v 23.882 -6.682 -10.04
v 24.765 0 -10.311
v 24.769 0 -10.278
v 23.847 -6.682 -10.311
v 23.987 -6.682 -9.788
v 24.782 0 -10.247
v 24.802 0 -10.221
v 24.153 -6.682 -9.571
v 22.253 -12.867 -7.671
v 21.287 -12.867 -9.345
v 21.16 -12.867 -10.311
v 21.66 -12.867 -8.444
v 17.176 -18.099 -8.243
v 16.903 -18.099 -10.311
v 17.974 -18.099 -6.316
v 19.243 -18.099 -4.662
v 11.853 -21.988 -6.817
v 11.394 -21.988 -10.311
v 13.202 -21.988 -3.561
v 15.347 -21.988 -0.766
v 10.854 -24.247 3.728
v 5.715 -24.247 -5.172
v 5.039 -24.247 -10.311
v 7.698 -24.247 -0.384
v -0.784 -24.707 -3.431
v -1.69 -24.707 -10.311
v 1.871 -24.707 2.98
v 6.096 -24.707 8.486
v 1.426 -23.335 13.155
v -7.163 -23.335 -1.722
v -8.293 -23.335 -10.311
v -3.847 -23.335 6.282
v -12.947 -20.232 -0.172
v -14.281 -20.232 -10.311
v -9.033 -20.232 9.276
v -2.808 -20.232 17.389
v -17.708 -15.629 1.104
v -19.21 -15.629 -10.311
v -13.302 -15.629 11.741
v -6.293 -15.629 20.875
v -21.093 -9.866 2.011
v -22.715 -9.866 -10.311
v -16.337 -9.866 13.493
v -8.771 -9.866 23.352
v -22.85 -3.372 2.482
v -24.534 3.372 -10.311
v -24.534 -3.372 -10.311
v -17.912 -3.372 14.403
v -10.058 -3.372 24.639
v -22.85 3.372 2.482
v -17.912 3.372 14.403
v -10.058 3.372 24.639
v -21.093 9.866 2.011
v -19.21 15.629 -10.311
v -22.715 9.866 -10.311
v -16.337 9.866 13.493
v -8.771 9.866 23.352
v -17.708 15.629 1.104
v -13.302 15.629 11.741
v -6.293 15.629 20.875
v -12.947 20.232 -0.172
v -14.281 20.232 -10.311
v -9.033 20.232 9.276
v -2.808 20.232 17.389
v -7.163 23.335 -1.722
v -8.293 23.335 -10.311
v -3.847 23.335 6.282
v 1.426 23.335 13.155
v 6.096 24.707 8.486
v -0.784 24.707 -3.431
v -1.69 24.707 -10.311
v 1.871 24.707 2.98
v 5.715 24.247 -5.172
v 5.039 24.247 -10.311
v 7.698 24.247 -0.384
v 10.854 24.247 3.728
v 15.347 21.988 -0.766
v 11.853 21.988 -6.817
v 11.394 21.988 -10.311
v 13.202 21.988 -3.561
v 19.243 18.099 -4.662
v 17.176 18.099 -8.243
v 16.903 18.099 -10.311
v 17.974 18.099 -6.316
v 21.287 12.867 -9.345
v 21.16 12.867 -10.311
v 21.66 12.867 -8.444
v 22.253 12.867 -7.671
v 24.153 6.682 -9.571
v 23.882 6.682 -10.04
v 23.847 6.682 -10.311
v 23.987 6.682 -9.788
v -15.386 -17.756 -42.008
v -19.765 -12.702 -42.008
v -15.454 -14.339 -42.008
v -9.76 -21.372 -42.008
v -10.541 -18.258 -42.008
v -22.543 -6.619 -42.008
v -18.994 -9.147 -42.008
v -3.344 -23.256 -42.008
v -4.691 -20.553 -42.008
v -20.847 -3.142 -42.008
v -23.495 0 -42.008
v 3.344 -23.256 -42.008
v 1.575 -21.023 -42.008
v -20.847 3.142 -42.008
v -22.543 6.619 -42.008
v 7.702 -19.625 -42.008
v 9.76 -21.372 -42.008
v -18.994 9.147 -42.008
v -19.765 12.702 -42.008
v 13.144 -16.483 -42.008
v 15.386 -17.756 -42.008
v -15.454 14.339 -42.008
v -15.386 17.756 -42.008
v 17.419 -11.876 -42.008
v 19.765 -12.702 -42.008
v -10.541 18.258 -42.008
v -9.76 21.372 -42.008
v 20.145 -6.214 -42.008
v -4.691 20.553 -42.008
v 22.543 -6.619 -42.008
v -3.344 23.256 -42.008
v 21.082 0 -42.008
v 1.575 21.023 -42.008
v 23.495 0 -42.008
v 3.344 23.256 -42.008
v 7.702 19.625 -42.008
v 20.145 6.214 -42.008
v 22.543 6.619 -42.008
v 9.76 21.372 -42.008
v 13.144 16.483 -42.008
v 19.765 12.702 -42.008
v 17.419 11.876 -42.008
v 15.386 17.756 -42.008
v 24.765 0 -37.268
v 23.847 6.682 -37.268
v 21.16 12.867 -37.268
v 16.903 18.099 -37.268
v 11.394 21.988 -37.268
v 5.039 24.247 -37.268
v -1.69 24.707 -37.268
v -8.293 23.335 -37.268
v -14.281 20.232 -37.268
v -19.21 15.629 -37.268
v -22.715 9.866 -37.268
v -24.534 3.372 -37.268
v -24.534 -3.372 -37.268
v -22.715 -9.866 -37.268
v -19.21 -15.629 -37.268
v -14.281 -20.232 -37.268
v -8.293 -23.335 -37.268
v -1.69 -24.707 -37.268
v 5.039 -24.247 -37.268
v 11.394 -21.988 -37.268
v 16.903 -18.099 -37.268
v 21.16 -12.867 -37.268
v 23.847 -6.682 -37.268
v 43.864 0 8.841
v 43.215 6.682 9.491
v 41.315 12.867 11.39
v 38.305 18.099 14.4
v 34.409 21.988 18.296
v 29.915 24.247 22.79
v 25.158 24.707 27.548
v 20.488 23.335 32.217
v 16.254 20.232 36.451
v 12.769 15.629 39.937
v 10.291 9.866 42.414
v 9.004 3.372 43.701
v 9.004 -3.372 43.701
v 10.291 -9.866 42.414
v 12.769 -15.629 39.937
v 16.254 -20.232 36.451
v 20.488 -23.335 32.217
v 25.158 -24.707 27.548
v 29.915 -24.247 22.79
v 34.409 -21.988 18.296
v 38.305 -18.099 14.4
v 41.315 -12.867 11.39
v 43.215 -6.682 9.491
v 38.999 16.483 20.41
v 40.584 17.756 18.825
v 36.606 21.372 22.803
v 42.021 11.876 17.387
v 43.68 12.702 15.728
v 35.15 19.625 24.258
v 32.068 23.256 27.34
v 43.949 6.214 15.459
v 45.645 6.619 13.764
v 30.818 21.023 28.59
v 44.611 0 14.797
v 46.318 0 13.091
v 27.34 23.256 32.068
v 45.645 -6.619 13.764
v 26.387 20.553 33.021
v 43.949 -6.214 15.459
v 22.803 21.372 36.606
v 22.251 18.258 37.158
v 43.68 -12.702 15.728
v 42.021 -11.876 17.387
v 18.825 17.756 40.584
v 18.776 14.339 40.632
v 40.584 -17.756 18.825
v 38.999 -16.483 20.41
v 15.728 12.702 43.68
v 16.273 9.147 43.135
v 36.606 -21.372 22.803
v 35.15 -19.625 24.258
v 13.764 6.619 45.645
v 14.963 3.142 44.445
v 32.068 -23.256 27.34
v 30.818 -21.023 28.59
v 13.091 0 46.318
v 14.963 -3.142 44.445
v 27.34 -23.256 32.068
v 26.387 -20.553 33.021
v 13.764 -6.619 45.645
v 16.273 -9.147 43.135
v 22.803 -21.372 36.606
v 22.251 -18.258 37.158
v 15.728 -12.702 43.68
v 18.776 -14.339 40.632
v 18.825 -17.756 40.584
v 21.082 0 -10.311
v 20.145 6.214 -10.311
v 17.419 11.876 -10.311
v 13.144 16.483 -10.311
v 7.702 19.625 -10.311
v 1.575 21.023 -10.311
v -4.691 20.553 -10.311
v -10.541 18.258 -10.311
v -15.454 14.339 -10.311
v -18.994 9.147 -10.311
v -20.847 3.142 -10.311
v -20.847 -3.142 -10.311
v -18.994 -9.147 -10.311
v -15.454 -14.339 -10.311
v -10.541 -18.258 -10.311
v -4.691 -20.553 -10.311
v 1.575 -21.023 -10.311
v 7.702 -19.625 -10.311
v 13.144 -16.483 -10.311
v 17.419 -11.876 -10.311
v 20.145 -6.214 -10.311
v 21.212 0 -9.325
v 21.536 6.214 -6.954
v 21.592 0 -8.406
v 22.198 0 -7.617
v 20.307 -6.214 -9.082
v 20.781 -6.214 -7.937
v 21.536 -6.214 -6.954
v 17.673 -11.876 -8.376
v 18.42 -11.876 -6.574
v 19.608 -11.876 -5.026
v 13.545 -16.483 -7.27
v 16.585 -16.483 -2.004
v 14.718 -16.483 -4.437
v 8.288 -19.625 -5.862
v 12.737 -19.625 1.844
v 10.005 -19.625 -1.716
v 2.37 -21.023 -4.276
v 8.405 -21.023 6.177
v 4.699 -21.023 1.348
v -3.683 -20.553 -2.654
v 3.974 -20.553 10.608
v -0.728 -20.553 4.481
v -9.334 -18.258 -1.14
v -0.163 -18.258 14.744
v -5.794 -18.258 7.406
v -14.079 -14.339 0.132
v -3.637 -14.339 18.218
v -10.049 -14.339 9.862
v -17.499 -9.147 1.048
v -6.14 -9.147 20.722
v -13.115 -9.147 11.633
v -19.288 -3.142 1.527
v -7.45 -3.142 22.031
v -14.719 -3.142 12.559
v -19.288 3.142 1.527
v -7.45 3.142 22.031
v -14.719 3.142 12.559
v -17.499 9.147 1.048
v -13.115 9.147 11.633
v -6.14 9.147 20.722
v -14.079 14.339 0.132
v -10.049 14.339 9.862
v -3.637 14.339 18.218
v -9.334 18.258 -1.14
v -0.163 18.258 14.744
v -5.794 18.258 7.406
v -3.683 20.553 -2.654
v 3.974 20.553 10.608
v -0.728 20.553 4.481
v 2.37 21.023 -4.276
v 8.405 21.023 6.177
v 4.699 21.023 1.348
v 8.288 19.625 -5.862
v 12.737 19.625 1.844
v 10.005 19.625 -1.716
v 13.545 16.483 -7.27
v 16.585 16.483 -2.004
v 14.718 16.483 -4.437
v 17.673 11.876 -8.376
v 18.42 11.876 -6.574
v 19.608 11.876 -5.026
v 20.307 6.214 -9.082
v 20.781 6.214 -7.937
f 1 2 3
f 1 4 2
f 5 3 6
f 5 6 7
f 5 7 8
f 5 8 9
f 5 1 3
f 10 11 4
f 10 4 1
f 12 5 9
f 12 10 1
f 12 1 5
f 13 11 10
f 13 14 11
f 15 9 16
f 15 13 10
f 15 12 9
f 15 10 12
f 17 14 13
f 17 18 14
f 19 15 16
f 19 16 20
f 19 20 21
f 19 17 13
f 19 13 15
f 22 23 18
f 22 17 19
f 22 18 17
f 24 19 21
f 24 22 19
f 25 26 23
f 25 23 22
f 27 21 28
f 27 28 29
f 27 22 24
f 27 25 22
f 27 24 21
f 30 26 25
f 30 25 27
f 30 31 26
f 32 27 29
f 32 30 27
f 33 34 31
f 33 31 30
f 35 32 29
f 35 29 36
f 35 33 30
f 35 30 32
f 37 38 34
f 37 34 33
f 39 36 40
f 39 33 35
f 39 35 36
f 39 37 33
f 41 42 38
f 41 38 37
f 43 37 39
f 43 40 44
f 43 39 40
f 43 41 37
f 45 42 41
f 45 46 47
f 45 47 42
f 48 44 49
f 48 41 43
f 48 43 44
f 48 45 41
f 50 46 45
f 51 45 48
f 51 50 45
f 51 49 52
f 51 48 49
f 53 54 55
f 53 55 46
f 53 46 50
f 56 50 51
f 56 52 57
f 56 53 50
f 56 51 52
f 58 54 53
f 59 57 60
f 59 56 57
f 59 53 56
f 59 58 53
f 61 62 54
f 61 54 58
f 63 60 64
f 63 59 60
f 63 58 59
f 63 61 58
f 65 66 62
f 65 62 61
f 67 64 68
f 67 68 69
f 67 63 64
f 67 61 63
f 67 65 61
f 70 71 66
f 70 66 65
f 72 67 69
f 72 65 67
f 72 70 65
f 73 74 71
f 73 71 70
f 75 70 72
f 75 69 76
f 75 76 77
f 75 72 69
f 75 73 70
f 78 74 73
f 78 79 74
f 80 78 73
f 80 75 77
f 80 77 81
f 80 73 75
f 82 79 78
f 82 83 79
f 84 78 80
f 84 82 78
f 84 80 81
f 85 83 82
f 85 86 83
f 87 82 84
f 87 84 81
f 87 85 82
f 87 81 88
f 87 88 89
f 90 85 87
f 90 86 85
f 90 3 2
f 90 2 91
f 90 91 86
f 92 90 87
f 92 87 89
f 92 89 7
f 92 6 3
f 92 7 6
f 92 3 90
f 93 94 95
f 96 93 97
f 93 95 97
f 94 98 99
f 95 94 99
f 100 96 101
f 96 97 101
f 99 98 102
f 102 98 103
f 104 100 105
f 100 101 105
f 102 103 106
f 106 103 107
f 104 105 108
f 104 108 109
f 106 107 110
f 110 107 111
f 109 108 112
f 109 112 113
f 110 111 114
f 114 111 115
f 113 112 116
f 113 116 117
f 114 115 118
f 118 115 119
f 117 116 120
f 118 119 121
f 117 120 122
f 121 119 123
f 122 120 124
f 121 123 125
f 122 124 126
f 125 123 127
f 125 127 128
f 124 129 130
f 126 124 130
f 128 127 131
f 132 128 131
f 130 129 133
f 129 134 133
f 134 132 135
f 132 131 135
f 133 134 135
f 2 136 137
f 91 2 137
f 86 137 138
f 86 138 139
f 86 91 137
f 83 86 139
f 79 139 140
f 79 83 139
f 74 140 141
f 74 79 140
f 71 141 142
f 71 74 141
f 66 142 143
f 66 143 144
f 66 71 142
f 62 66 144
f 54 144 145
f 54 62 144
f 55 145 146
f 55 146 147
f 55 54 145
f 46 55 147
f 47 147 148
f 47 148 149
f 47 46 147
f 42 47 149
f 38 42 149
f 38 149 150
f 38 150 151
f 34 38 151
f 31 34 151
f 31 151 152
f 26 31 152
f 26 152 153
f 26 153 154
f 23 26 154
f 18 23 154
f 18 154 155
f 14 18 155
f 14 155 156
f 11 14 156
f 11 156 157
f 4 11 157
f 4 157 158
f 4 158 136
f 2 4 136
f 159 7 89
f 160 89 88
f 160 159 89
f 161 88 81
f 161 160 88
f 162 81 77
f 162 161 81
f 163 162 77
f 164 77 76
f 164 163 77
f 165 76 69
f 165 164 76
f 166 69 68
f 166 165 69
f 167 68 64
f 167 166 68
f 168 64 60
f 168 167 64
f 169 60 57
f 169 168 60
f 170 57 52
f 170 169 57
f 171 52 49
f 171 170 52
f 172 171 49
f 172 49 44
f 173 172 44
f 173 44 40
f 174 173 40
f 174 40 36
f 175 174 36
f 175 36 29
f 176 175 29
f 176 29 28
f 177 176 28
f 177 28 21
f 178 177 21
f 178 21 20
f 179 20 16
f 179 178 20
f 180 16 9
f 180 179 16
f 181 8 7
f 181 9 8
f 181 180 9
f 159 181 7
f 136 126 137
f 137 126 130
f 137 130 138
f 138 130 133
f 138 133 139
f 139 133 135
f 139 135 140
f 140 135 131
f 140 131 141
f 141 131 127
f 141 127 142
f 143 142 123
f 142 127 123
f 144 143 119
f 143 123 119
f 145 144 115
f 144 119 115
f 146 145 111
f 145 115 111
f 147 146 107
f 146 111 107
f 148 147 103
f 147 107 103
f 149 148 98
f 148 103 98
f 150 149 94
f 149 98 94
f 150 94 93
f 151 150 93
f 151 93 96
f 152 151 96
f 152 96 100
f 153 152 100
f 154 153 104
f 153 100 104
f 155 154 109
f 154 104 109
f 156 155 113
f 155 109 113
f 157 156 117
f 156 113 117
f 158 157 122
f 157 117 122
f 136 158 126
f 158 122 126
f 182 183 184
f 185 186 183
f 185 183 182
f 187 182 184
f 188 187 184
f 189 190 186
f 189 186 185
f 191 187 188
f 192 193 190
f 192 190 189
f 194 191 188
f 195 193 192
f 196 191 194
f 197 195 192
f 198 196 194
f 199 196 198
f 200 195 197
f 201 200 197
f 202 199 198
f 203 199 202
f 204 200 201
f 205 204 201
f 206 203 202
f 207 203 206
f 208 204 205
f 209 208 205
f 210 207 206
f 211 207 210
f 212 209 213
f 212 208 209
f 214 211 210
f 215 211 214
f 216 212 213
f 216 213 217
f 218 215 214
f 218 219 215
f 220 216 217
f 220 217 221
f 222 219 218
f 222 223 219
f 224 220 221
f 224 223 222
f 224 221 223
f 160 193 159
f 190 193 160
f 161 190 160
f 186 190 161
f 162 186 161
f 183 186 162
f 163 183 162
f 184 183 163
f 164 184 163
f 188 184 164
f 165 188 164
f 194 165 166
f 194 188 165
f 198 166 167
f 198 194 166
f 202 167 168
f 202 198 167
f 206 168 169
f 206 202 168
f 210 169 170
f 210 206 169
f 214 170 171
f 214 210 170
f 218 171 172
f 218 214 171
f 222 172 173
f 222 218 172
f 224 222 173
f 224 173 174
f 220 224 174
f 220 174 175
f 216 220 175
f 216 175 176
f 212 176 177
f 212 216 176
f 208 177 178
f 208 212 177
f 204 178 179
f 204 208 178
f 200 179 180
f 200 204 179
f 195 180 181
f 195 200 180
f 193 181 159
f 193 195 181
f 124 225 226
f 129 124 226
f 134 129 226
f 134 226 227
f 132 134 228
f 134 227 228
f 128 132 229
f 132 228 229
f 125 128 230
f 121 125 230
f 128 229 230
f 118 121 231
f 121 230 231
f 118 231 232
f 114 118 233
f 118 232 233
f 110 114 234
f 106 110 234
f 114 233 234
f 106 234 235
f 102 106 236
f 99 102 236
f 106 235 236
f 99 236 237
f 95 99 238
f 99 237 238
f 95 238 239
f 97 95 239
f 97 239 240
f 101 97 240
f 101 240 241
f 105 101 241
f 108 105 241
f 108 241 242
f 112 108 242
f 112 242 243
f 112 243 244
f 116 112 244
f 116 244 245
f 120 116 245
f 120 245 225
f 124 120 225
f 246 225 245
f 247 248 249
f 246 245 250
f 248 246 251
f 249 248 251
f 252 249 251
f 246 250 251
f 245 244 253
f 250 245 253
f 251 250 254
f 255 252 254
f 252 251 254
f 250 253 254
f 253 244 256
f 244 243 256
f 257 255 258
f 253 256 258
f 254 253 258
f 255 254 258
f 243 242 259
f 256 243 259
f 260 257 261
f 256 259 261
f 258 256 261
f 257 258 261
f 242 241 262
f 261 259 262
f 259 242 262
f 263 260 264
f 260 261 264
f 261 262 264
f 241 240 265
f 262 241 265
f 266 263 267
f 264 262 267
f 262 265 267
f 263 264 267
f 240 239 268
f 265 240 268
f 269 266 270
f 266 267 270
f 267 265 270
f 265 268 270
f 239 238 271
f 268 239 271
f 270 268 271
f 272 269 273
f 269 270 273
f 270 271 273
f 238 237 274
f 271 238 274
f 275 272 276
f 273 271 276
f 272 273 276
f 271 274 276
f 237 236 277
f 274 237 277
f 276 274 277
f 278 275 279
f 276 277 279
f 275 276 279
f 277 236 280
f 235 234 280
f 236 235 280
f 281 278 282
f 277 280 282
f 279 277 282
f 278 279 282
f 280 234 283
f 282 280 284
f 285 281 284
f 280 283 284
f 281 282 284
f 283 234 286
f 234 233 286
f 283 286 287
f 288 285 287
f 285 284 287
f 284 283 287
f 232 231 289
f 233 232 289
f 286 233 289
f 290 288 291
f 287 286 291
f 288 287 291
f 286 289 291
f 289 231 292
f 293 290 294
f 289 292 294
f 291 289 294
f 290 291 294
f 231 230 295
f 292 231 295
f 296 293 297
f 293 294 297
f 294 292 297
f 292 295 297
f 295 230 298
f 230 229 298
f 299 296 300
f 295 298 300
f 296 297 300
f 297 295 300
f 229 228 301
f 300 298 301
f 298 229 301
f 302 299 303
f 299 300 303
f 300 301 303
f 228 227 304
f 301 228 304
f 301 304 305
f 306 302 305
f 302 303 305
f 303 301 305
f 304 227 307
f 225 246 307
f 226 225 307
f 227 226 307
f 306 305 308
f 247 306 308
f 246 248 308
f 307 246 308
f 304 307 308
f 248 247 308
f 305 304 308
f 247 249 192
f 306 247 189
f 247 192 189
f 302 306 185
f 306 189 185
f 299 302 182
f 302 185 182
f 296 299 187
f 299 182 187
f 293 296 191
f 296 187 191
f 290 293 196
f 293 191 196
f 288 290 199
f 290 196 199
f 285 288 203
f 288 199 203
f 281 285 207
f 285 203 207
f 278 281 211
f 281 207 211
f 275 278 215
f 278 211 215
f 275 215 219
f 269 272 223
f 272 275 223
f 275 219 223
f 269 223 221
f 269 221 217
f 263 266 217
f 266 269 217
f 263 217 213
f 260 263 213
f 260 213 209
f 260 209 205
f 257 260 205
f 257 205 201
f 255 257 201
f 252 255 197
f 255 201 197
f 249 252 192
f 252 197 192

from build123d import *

# Parameters (mm, degrees)
F2_R     = 24.765
F2_R_2   = 21.082
F4_SIZE2 = 1.27
F4_SIZE  = 4.7397045256
F5_SIZE2 = 1.27
F5_SIZE  = 4.7397045256


with BuildPart() as f3:
    # F3: sweep along a path in F0
    with BuildLine(Plane.XZ) as f3_path:
        Line((0, -42.0079988722), (0, -10.3106039946))
        ThreePointArc((0, -10.3106039946), (1.8947906767, -0.7848479962), (7.2906980027, 7.2906980027))
        Line((7.2906980027, 7.2906980027), (29.7041408666, 29.7041408666))
    # F2 (on plane+point) → F3 (sweep)
    with BuildSketch(Plane.XY.offset(-42.0079988722)):
        Circle(F2_R)
        Circle(F2_R_2, mode=Mode.SUBTRACT)
    sweep(path=f3_path.line)

    # F4
    f4_edges = [f3.edges().sort_by_distance(p)[0] for p in [
        (12.192641, 0, 47.21564),
    ]]
    f4_side = f3.faces().sort_by_distance((0.98592, 0, 36.008919))[0]
    chamfer(f4_edges, length=F4_SIZE, length2=F4_SIZE2, reference=f4_side)

    # F5
    f5_edges = [f3.edges().sort_by_distance(p)[0] for p in [
        (-24.765, 0, -42.007999),
    ]]
    f5_side = f3.faces().sort_by_distance((-24.765, 0, -26.159301))[0]
    chamfer(f5_edges, length=F5_SIZE, length2=F5_SIZE2, reference=f5_side)


solid = f3.part
